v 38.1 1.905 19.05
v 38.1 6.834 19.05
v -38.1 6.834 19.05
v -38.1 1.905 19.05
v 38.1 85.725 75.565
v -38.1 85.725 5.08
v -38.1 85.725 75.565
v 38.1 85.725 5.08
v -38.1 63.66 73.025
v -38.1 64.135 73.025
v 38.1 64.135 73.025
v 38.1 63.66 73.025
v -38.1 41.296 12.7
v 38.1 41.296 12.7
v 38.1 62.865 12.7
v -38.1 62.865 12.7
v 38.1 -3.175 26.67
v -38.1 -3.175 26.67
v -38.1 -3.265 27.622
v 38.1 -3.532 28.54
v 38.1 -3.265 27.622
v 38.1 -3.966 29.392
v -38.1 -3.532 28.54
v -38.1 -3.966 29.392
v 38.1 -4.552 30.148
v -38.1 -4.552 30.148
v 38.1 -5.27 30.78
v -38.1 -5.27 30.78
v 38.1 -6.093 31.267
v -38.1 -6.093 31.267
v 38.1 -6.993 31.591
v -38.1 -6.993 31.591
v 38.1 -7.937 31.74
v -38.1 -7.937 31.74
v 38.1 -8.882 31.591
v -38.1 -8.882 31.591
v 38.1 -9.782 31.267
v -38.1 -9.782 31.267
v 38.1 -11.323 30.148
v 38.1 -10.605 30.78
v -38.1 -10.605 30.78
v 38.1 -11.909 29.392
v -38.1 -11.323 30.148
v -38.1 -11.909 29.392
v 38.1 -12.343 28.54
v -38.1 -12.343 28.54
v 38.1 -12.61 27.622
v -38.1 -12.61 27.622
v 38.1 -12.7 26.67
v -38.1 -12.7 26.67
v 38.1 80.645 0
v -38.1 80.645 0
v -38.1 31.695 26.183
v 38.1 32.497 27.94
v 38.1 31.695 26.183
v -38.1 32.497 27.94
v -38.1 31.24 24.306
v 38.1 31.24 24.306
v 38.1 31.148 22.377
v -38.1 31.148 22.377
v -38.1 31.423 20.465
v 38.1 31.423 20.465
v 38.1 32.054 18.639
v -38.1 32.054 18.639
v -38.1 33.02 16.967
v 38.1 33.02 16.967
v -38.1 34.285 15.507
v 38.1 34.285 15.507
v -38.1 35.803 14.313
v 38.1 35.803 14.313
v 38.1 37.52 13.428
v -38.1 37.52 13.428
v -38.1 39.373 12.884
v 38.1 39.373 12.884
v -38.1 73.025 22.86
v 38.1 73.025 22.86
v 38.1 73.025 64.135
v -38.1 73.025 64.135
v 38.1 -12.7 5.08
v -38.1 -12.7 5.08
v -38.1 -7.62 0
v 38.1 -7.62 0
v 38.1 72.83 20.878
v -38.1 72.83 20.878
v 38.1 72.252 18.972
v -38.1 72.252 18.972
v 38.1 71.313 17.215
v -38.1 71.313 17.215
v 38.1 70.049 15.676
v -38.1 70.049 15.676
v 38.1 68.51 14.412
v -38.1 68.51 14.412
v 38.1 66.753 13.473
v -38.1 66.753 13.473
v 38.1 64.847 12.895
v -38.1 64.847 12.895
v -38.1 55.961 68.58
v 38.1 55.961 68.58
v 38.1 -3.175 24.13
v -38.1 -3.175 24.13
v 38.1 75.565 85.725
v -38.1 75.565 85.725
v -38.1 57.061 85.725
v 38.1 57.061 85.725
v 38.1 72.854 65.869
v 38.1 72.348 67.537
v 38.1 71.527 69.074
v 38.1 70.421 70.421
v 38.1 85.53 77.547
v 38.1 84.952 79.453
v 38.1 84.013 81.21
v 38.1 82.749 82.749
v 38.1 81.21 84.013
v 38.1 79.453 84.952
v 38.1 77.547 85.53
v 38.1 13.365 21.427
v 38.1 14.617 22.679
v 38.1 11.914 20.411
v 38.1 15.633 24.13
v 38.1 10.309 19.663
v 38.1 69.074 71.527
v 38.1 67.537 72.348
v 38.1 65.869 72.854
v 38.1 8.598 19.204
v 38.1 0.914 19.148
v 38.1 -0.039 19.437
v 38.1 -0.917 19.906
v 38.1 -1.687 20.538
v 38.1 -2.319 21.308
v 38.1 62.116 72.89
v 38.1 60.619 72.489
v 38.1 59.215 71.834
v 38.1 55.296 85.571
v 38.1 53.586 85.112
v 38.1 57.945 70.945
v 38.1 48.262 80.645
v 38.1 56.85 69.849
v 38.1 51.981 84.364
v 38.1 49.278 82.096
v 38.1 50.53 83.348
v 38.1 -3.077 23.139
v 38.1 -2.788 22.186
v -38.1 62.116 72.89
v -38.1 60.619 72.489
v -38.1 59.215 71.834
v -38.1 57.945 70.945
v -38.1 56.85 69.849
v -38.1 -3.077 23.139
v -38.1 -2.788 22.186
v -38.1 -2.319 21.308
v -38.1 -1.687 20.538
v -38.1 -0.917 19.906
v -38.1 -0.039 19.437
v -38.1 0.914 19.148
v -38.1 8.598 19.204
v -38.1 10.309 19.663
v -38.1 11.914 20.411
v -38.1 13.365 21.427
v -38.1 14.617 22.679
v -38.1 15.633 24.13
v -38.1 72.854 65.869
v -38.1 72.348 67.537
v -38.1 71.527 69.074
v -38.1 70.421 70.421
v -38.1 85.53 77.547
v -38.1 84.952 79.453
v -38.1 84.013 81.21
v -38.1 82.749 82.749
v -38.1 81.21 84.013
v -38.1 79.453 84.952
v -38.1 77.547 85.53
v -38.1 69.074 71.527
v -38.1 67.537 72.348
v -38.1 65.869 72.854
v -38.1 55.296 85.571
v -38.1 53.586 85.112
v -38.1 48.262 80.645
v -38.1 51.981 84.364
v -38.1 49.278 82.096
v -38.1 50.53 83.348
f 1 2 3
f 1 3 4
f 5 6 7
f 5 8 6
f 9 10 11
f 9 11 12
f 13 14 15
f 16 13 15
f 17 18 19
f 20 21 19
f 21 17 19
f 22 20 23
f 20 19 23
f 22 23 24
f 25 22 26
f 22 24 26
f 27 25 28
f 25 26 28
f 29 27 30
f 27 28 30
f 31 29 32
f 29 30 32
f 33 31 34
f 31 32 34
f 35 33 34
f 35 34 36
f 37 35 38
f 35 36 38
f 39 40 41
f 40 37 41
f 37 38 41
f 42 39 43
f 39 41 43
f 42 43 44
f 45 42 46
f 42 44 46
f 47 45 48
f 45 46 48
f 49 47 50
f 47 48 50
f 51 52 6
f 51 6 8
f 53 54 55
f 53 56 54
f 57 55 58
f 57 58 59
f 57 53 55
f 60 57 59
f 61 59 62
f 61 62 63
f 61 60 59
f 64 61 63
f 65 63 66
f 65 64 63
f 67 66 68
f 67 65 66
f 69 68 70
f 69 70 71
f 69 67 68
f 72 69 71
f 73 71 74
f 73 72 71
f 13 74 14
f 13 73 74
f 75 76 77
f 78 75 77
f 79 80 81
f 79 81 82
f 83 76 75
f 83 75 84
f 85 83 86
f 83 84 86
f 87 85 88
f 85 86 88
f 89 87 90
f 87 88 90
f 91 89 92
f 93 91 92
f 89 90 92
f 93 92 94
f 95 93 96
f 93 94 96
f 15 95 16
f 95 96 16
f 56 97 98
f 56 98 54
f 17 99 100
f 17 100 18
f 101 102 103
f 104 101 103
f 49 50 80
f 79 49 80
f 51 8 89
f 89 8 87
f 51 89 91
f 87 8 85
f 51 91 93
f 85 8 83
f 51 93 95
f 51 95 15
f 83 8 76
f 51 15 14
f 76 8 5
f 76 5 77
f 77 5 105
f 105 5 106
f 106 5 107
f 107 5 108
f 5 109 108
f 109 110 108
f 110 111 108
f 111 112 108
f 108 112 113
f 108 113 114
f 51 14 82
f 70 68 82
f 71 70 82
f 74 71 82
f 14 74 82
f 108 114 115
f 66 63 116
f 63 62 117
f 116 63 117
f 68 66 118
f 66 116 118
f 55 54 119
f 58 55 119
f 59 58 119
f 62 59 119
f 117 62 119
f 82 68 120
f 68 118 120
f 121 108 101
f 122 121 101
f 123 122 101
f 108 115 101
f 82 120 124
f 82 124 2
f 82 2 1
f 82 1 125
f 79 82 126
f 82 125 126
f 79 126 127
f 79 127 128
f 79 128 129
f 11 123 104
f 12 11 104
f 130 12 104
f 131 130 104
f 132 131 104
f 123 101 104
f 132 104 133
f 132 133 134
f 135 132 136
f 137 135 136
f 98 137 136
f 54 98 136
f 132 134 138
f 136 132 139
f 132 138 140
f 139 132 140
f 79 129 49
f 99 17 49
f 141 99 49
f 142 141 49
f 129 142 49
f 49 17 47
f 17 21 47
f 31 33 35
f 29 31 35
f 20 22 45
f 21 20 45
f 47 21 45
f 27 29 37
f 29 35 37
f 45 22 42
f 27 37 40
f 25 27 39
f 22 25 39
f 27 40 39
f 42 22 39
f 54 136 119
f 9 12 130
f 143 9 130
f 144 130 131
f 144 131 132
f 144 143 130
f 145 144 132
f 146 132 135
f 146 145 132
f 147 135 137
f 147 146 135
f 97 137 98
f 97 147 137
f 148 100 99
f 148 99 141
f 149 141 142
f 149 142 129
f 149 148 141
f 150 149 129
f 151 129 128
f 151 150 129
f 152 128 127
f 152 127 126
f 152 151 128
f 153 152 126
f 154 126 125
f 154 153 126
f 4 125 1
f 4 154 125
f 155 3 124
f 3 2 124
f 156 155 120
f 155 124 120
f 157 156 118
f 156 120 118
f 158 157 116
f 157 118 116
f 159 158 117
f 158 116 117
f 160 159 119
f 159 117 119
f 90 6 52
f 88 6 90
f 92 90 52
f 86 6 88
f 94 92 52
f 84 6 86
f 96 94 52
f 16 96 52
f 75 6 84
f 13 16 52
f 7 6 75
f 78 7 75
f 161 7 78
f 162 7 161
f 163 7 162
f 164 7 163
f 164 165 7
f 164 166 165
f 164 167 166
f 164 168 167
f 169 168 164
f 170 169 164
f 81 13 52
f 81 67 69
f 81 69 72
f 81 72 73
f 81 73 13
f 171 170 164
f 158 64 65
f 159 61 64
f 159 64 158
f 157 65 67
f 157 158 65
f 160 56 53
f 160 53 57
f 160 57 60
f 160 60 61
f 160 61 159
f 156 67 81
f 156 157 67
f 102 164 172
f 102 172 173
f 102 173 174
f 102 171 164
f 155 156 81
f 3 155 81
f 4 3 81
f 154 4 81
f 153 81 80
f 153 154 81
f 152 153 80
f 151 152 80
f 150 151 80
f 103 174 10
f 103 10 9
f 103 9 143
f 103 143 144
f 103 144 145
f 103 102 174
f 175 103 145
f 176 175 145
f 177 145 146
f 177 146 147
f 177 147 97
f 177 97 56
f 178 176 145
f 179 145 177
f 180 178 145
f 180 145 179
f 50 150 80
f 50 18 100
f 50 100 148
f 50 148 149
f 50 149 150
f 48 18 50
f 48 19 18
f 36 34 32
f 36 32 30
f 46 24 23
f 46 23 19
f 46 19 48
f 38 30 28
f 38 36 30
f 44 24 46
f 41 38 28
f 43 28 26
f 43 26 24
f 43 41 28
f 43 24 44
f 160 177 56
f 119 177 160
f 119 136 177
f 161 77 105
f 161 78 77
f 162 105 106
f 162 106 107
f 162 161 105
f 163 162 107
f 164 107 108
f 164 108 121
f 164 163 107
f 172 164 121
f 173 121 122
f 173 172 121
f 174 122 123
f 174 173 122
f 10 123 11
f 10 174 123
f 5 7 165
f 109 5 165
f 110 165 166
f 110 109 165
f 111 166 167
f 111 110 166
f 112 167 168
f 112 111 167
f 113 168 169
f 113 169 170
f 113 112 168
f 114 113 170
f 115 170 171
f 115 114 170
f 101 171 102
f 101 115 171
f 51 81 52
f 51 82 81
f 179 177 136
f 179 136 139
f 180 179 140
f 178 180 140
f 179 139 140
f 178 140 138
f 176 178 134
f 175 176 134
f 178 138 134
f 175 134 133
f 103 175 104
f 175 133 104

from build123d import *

# Parameters (mm, degrees)
F1_DEPTH    = 38.1
F3_DEPTH    = 76.2
F5_DEPTH    = 76.201
F6_T1_DEPTH = 76.2
F6_T3_DEPTH = 101.6
F7_R        = 10.16
F8_SIZE     = 5.08
F9_R        = 8.89


# Not quite as in the source:
# - a fillet or chamfer that OpenCascade refuses, or shapes differently, is made with other operations: its cross-section is extruded or revolved along the edge and cut away or added


with BuildPart() as f1:
    # F0 (on Right) → F1 (new body, symmetric)
    with BuildSketch(Plane.YZ):
        Polygon((-12.7, 31.75), (-12.7, 0), (12.7, 0), (56.6940905122, 76.2), (76.2, 76.2), (76.2, 0), (85.725, 0), (85.725, 85.725), (51.1948291982, 85.725), (12.7, 19.05), (7.200738686, 9.525), (-3.175, 9.525), (-3.175, 19.05), (-3.175, 31.75), align=None)
        Polygon((12.7, 19.05), (-3.175, 19.05), (-3.175, 9.525), (7.200738686, 9.525), align=None)
    extrude(amount=F1_DEPTH, both=True)

    # F2 (on face) → F3 (join, through all)
    with BuildSketch(Plane.YZ.offset(38.1)):
        Polygon((56.6940905122, 76.2), (12.7, 0), (76.2, 0), (76.2, 76.2), align=None)
    extrude(amount=-F3_DEPTH)

    # F4 (on face) → F5 (cut, through all)
    with BuildSketch(Plane.YZ.offset(38.1)):
        Polygon((58.5271776169, 73.025), (23.6985226281, 12.7), (73.025, 12.7), (73.025, 73.025), align=None)
    extrude(amount=-F5_DEPTH, mode=Mode.SUBTRACT)

    # F6: fillet of radius 5.08 on 3 edges, made by hand

    # F6_s2 → F6_t1 (join)
    with BuildSketch(Plane.YZ.offset(-38.1)):
        with BuildLine():
            ThreePointArc((-3.175, 24.13), (-1.6871024484, 20.5378975516), (1.905, 19.05))
            Line((1.905, 19.05), (-3.175, 19.05))
            Line((-3.175, 19.05), (-3.175, 24.13))
        make_face()
    extrude(amount=F6_T1_DEPTH)

    # F6_s4 → F6_t3 (cut)
    with BuildSketch(Plane.YZ.offset(-50.8)):
        with BuildLine():
            ThreePointArc((-3.175, 26.67), (-4.6628975516, 30.2621024484), (-8.255, 31.75))
            Line((-8.255, 31.75), (-3.175, 31.75))
            Line((-3.175, 31.75), (-3.175, 26.67))
        make_face()
        with BuildLine():
            ThreePointArc((-7.62, 31.75), (-11.2121024484, 30.2621024484), (-12.7, 26.67))
            Line((-12.7, 26.67), (-12.7, 31.75))
            Line((-12.7, 31.75), (-7.62, 31.75))
        make_face()
    extrude(amount=F6_T3_DEPTH, mode=Mode.SUBTRACT)

    # F7
    f7_edges = [f1.edges().sort_by_distance(p)[0] for p in [
        (0, 12.7, 19.05),
        (0, 51.194829, 85.725),
        (0, 85.725, 85.725),
        (0, 23.698523, 12.7),
        (0, 73.025, 12.7),
    ]]
    fillet(f7_edges, radius=F7_R)

    # F8
    f8_edges = [f1.edges().sort_by_distance(p)[0] for p in [
        (0, 85.725, 0),
        (0, -12.7, 0),
    ]]
    chamfer(f8_edges, length=F8_SIZE)

    # F9
    f9_edges = [f1.edges().sort_by_distance(p)[0] for p in [
        (0, 73.025, 73.025),
        (0, 58.527178, 73.025),
    ]]
    fillet(f9_edges, radius=F9_R)


solid = f1.part
